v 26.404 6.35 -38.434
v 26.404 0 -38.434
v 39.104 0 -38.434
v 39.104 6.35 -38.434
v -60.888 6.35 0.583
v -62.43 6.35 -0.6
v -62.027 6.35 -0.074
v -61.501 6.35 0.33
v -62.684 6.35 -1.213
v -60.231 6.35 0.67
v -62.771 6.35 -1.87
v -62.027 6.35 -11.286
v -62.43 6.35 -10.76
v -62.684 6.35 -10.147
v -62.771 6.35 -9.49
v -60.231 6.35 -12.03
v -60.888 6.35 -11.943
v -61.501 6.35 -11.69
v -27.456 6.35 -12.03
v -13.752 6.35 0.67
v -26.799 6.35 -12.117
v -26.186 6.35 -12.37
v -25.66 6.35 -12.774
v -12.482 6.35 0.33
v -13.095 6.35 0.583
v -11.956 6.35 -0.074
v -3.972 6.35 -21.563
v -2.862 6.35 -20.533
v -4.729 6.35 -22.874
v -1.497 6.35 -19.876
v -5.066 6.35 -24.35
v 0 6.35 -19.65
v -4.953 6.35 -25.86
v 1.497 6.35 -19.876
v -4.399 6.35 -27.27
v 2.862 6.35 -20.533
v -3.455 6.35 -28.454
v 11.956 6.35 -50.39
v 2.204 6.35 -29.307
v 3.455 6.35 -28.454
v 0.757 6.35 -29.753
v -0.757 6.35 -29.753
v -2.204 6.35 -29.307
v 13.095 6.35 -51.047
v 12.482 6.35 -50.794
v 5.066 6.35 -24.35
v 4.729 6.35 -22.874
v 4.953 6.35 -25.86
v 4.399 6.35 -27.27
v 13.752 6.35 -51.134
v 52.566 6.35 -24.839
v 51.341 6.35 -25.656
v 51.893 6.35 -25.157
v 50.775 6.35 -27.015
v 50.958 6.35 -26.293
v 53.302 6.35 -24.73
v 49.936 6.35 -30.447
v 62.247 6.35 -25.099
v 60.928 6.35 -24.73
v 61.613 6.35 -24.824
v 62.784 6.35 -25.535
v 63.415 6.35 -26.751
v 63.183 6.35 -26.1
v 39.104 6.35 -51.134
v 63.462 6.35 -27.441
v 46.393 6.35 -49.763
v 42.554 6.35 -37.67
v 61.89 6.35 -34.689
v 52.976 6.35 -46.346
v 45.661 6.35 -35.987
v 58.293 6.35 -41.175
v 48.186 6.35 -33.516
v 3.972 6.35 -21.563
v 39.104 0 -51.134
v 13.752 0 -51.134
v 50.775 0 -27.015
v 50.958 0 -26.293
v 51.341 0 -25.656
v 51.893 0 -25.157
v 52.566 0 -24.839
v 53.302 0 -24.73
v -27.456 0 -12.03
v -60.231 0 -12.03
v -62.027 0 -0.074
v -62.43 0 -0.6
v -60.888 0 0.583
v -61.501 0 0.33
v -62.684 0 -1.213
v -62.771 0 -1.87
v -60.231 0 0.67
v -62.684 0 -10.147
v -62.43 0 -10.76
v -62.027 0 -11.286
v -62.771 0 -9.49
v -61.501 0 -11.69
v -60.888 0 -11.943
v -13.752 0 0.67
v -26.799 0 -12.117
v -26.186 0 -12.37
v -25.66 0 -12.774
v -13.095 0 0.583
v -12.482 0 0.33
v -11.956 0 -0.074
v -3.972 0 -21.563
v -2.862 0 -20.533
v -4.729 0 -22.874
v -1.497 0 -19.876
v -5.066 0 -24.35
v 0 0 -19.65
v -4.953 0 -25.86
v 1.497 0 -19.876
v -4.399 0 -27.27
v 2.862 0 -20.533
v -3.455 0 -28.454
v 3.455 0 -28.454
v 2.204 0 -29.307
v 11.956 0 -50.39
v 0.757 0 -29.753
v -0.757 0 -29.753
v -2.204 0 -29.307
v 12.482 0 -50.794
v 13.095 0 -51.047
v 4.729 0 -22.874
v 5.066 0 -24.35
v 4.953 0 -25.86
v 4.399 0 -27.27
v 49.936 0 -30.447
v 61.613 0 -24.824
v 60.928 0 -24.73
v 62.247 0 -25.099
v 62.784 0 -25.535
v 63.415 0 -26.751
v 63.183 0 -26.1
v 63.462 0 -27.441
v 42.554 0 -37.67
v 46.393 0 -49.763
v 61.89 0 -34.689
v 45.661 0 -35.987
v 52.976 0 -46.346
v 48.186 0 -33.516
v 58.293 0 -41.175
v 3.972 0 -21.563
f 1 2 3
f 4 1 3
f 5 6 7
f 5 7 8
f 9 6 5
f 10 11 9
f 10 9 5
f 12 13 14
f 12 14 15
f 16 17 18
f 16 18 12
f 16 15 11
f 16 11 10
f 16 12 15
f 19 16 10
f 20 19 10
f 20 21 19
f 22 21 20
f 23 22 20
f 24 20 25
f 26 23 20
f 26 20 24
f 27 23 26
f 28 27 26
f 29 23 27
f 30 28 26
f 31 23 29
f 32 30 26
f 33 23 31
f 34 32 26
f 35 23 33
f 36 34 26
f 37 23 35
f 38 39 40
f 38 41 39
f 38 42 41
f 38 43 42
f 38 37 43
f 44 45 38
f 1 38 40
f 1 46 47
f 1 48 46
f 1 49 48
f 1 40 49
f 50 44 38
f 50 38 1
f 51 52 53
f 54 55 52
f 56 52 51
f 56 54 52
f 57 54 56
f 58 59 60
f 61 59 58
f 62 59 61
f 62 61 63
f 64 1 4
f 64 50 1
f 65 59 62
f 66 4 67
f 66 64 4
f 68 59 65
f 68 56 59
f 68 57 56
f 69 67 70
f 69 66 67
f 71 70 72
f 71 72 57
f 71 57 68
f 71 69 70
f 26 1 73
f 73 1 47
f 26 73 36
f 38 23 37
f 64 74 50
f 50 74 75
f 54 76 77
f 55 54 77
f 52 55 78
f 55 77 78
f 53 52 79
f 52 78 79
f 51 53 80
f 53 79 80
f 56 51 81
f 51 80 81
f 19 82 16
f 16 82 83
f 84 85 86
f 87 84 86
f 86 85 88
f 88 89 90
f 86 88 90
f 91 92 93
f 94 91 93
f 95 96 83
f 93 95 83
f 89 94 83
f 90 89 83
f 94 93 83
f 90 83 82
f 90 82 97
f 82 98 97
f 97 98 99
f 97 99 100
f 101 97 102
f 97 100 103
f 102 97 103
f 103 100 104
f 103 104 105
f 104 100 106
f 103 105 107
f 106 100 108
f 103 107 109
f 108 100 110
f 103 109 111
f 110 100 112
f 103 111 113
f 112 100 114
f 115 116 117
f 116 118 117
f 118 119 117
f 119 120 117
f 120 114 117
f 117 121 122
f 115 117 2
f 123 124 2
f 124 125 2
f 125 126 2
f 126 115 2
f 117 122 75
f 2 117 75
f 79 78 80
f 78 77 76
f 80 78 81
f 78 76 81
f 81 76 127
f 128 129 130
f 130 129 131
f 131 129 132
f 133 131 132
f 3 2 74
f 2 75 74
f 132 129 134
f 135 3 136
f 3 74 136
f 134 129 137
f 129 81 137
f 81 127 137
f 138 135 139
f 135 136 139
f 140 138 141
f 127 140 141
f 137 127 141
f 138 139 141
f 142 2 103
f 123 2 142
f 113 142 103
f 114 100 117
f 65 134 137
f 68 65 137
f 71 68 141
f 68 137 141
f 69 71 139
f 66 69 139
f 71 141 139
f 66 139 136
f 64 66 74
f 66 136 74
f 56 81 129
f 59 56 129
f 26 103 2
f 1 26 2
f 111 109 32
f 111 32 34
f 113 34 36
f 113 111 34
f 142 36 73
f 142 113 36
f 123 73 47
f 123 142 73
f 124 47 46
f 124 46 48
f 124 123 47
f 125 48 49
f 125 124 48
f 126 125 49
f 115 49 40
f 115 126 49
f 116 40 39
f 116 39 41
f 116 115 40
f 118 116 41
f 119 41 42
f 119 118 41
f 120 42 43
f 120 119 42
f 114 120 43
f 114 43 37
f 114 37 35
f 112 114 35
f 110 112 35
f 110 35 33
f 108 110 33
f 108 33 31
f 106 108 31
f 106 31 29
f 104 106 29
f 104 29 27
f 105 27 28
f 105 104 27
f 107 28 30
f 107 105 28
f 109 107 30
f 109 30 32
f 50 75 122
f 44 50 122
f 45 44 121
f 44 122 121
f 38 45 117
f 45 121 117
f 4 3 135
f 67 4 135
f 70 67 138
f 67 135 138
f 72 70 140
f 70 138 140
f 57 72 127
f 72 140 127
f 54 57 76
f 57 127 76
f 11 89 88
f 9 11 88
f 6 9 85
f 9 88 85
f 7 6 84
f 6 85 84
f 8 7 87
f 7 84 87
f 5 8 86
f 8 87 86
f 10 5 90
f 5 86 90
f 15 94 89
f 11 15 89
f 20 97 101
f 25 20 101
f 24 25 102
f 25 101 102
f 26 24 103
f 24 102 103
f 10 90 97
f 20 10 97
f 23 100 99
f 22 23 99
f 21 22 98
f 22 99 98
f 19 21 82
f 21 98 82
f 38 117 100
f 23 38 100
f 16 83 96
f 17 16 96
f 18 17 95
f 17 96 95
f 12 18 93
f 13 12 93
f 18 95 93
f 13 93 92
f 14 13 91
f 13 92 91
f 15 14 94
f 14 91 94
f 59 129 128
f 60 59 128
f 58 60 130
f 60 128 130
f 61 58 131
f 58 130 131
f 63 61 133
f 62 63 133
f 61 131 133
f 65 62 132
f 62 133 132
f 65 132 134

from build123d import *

# Parameters (mm, degrees)
SKETCH1_R           = 5.08
BOSS_EXTRUDE1_DEPTH = 6.35


with BuildPart() as part:
    # Sketch1 → Boss-Extrude1 (new body)
    with BuildSketch(Plane(origin=(0, 0, 0), x_dir=(1, 0, 0), z_dir=(0, 1, 0))):
        with BuildLine():
            Line((-11.956051224, 0.073941191), (26.403889176, 38.433881591))
            Line((26.403889176, 38.433881591), (39.103889176, 38.433881591))
            ThreePointArc((39.103889176, 38.433881591), (47.009448875, 34.839896868), (50.775072277, 27.014637718))
            ThreePointArc((50.775072277, 27.014637718), (51.59882499, 25.385821387), (53.302203848, 24.729992415))
            Line((53.302203848, 24.729992415), (60.928206609, 24.729992415))
            ThreePointArc((60.928206609, 24.729992415), (62.783570301, 25.53528046), (63.462475569, 27.440523463))
            ThreePointArc((63.462475569, 27.440523463), (55.823997921, 43.955508609), (39.103889176, 51.133881591))
            Line((39.103889176, 51.133881591), (13.752102448, 51.133881591))
            ThreePointArc((13.752102448, 51.133881591), (12.78008653, 50.940535604), (11.956051224, 50.389932815))
            Line((11.956051224, 50.389932815), (-25.6599404, 12.773941191))
            ThreePointArc((-25.6599404, 12.773941191), (-26.483975706, 12.223338403), (-27.455991624, 12.029992415))
            Line((-27.455991624, 12.029992415), (-60.230604195, 12.029992415))
            ThreePointArc((-60.230604195, 12.029992415), (-62.026655419, 11.28604364), (-62.770604195, 9.489992415))
            Line((-62.770604195, 9.489992415), (-62.770604195, 1.869992415))
            ThreePointArc((-62.770604195, 1.869992415), (-62.026655419, 0.073941191), (-60.230604195, -0.670007585))
            Line((-60.230604195, -0.670007585), (-13.752102448, -0.670007585))
            ThreePointArc((-13.752102448, -0.670007585), (-12.78008653, -0.476661597), (-11.956051224, 0.073941191))
        make_face()
        with Locations(Location((0, 24.729992415, 0), (0, 0, 270))):
            Circle(SKETCH1_R, mode=Mode.SUBTRACT)
    extrude(amount=BOSS_EXTRUDE1_DEPTH)


solid = part.part
